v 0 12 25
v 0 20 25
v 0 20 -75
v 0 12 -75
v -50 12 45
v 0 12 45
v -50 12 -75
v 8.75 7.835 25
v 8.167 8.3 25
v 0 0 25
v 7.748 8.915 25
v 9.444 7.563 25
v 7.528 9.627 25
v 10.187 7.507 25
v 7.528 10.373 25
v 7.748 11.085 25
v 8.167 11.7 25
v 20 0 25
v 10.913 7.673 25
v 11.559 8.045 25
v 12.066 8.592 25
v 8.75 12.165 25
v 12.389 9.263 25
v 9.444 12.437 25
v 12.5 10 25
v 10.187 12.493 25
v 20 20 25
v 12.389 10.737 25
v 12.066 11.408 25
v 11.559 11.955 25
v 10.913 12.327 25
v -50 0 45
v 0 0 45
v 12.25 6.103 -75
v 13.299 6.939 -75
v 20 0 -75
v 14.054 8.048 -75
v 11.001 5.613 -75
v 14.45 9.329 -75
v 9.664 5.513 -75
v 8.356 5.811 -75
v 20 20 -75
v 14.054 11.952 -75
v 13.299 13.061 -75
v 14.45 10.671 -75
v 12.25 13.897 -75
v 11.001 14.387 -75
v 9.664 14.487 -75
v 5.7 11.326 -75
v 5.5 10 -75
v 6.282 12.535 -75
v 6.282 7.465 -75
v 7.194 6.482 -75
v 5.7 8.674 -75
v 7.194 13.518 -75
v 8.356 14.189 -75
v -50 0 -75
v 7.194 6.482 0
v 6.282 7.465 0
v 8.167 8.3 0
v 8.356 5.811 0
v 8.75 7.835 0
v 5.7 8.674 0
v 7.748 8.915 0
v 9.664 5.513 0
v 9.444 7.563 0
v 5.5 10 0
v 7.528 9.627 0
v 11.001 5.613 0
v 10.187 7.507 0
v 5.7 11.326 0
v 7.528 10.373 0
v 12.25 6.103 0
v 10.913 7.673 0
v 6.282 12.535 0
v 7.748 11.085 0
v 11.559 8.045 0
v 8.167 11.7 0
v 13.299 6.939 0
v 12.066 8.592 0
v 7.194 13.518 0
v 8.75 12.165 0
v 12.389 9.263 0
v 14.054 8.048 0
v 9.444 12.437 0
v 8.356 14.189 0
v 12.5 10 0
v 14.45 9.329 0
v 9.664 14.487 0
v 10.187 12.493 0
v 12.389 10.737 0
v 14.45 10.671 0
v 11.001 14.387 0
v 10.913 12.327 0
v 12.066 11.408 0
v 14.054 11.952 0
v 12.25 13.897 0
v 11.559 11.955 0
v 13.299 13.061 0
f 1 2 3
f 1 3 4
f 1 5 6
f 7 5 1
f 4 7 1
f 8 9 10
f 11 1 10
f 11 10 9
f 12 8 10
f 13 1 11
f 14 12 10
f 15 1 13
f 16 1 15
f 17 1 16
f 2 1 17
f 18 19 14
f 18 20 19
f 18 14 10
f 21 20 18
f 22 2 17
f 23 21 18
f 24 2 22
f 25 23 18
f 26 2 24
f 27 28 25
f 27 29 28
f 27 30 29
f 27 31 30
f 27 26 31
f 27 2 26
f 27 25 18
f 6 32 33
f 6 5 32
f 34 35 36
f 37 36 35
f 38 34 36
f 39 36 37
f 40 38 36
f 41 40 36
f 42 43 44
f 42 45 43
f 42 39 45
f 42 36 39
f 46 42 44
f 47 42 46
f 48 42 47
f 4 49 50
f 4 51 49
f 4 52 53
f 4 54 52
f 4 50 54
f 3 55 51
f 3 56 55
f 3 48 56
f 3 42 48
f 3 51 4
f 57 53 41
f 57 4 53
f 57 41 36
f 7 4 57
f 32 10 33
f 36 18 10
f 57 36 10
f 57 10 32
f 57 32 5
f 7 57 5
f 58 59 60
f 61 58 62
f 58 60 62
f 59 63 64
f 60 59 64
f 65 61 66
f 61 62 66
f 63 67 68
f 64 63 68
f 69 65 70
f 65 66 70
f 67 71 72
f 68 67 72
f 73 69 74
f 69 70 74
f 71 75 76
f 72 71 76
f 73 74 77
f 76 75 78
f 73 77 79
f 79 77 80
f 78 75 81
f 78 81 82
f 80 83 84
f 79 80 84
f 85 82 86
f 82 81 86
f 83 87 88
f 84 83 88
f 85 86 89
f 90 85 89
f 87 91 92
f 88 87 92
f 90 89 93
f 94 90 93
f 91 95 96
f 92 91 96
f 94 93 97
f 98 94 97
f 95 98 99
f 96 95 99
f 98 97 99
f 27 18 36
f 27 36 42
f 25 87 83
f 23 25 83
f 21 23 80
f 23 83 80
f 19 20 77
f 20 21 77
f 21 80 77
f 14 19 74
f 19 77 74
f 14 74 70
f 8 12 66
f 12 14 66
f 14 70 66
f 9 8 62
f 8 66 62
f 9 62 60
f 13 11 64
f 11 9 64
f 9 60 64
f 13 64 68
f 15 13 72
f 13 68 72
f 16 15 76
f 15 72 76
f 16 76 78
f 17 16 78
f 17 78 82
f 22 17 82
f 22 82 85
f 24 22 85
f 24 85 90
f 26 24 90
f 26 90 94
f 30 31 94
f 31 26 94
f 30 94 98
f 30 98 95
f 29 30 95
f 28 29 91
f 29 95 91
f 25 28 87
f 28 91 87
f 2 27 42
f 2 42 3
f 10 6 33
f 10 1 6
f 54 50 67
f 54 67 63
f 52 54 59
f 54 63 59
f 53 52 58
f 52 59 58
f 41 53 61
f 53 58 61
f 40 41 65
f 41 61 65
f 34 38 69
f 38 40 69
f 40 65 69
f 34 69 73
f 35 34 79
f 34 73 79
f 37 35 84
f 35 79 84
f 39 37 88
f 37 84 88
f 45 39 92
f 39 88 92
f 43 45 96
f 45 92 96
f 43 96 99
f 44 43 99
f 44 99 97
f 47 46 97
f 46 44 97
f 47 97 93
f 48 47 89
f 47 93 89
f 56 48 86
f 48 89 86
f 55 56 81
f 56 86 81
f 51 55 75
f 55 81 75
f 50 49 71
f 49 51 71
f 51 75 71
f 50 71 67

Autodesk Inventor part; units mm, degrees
ref_plane "YZ Plane" through (0, 0, 0) normal (1, 0, 0) x (0, 1, 0)
ref_plane "XZ Plane" through (0, 0, 0) normal (0, 1, 0) x (-1, 0, 0)
ref_plane "XY Plane" through (0, 0, 0) normal (0, 0, 1) x (1, 0, 0)
sketch "Sketch1" plane through (0, 0, 0) normal (0, 0, 1) x (1, 0, 0)
  line L0 (0, 20) -> (20, 20)
  line L1 (20, 20) -> (20, 0)
  line L2 (20, 0) -> (0, 0)
  line L3 (0, 0) -> (0, 20)
  circle A0 centre (10, 10) radius 2.5
  dimension "d0" = 20
  dimension "d1" = 20
  dimension "d5" = 10
  dimension "d6" = 10
  dimension "d7" = 5
extrude "Extrusion2" add sketch "Sketch1" along normal blind 25
sketch "Sketch4" plane through (0, 0, 25) normal (0, 0, 1) x (1, 0, 0)
  line L0 (0, 0) -> (20, 0) projected
  line L1 (0, 0) -> (-50, 0)
  line L2 (-50, 0) -> (-50, 12)
  line L3 (-50, 12) -> (0, 12)
  line L4 (0, 12) -> (0, 0)
  point P0 (0, 6)
  dimension "d13" = 12
  dimension "d14" = 50
extrude "Extrusion4" add sketch "Sketch4" against normal blind 100
sketch "Sketch5" plane through (0, 0, 0) normal (0, 0, -1) x (-1, 0, 0)
  line L0 (0, 0) -> (-20, 0) projected
  line L1 (-20, 0) -> (-20, 20) projected
  line L2 (0, 0) -> (-20, 0)
  line L3 (-20, 0) -> (-20, 20)
  line L4 (-20, 20) -> (0, 20)
  line L5 (0, 20) -> (0, 0)
  circle A0 centre (-10, 10) radius 2.5 projected
  circle A1 centre (-10, 10) radius 4.5
  dimension "d17" = 9
extrude "Extrusion5" add sketch "Sketch5" along normal blind 75 contours L0 L1 L4 L5
sketch "Sketch6" plane through (0, 0, 25) normal (0, 0, 1) x (1, 0, 0)
  line L0 (-50, 0) -> (-50, 12) projected
  line L1 (0, 0) -> (-50, 0)
  line L2 (-50, 0) -> (-50, 12)
  line L3 (-50, 12) -> (0, 12)
  line L4 (0, 12) -> (0, 0)
extrude "Extrusion6" add sketch "Sketch6" along normal blind 20
equation "\"d5\" = 0.5 * d1"
equation "\"d6\" = 0.5 * d0"
properties part number "Touchscreen mount L v06"
